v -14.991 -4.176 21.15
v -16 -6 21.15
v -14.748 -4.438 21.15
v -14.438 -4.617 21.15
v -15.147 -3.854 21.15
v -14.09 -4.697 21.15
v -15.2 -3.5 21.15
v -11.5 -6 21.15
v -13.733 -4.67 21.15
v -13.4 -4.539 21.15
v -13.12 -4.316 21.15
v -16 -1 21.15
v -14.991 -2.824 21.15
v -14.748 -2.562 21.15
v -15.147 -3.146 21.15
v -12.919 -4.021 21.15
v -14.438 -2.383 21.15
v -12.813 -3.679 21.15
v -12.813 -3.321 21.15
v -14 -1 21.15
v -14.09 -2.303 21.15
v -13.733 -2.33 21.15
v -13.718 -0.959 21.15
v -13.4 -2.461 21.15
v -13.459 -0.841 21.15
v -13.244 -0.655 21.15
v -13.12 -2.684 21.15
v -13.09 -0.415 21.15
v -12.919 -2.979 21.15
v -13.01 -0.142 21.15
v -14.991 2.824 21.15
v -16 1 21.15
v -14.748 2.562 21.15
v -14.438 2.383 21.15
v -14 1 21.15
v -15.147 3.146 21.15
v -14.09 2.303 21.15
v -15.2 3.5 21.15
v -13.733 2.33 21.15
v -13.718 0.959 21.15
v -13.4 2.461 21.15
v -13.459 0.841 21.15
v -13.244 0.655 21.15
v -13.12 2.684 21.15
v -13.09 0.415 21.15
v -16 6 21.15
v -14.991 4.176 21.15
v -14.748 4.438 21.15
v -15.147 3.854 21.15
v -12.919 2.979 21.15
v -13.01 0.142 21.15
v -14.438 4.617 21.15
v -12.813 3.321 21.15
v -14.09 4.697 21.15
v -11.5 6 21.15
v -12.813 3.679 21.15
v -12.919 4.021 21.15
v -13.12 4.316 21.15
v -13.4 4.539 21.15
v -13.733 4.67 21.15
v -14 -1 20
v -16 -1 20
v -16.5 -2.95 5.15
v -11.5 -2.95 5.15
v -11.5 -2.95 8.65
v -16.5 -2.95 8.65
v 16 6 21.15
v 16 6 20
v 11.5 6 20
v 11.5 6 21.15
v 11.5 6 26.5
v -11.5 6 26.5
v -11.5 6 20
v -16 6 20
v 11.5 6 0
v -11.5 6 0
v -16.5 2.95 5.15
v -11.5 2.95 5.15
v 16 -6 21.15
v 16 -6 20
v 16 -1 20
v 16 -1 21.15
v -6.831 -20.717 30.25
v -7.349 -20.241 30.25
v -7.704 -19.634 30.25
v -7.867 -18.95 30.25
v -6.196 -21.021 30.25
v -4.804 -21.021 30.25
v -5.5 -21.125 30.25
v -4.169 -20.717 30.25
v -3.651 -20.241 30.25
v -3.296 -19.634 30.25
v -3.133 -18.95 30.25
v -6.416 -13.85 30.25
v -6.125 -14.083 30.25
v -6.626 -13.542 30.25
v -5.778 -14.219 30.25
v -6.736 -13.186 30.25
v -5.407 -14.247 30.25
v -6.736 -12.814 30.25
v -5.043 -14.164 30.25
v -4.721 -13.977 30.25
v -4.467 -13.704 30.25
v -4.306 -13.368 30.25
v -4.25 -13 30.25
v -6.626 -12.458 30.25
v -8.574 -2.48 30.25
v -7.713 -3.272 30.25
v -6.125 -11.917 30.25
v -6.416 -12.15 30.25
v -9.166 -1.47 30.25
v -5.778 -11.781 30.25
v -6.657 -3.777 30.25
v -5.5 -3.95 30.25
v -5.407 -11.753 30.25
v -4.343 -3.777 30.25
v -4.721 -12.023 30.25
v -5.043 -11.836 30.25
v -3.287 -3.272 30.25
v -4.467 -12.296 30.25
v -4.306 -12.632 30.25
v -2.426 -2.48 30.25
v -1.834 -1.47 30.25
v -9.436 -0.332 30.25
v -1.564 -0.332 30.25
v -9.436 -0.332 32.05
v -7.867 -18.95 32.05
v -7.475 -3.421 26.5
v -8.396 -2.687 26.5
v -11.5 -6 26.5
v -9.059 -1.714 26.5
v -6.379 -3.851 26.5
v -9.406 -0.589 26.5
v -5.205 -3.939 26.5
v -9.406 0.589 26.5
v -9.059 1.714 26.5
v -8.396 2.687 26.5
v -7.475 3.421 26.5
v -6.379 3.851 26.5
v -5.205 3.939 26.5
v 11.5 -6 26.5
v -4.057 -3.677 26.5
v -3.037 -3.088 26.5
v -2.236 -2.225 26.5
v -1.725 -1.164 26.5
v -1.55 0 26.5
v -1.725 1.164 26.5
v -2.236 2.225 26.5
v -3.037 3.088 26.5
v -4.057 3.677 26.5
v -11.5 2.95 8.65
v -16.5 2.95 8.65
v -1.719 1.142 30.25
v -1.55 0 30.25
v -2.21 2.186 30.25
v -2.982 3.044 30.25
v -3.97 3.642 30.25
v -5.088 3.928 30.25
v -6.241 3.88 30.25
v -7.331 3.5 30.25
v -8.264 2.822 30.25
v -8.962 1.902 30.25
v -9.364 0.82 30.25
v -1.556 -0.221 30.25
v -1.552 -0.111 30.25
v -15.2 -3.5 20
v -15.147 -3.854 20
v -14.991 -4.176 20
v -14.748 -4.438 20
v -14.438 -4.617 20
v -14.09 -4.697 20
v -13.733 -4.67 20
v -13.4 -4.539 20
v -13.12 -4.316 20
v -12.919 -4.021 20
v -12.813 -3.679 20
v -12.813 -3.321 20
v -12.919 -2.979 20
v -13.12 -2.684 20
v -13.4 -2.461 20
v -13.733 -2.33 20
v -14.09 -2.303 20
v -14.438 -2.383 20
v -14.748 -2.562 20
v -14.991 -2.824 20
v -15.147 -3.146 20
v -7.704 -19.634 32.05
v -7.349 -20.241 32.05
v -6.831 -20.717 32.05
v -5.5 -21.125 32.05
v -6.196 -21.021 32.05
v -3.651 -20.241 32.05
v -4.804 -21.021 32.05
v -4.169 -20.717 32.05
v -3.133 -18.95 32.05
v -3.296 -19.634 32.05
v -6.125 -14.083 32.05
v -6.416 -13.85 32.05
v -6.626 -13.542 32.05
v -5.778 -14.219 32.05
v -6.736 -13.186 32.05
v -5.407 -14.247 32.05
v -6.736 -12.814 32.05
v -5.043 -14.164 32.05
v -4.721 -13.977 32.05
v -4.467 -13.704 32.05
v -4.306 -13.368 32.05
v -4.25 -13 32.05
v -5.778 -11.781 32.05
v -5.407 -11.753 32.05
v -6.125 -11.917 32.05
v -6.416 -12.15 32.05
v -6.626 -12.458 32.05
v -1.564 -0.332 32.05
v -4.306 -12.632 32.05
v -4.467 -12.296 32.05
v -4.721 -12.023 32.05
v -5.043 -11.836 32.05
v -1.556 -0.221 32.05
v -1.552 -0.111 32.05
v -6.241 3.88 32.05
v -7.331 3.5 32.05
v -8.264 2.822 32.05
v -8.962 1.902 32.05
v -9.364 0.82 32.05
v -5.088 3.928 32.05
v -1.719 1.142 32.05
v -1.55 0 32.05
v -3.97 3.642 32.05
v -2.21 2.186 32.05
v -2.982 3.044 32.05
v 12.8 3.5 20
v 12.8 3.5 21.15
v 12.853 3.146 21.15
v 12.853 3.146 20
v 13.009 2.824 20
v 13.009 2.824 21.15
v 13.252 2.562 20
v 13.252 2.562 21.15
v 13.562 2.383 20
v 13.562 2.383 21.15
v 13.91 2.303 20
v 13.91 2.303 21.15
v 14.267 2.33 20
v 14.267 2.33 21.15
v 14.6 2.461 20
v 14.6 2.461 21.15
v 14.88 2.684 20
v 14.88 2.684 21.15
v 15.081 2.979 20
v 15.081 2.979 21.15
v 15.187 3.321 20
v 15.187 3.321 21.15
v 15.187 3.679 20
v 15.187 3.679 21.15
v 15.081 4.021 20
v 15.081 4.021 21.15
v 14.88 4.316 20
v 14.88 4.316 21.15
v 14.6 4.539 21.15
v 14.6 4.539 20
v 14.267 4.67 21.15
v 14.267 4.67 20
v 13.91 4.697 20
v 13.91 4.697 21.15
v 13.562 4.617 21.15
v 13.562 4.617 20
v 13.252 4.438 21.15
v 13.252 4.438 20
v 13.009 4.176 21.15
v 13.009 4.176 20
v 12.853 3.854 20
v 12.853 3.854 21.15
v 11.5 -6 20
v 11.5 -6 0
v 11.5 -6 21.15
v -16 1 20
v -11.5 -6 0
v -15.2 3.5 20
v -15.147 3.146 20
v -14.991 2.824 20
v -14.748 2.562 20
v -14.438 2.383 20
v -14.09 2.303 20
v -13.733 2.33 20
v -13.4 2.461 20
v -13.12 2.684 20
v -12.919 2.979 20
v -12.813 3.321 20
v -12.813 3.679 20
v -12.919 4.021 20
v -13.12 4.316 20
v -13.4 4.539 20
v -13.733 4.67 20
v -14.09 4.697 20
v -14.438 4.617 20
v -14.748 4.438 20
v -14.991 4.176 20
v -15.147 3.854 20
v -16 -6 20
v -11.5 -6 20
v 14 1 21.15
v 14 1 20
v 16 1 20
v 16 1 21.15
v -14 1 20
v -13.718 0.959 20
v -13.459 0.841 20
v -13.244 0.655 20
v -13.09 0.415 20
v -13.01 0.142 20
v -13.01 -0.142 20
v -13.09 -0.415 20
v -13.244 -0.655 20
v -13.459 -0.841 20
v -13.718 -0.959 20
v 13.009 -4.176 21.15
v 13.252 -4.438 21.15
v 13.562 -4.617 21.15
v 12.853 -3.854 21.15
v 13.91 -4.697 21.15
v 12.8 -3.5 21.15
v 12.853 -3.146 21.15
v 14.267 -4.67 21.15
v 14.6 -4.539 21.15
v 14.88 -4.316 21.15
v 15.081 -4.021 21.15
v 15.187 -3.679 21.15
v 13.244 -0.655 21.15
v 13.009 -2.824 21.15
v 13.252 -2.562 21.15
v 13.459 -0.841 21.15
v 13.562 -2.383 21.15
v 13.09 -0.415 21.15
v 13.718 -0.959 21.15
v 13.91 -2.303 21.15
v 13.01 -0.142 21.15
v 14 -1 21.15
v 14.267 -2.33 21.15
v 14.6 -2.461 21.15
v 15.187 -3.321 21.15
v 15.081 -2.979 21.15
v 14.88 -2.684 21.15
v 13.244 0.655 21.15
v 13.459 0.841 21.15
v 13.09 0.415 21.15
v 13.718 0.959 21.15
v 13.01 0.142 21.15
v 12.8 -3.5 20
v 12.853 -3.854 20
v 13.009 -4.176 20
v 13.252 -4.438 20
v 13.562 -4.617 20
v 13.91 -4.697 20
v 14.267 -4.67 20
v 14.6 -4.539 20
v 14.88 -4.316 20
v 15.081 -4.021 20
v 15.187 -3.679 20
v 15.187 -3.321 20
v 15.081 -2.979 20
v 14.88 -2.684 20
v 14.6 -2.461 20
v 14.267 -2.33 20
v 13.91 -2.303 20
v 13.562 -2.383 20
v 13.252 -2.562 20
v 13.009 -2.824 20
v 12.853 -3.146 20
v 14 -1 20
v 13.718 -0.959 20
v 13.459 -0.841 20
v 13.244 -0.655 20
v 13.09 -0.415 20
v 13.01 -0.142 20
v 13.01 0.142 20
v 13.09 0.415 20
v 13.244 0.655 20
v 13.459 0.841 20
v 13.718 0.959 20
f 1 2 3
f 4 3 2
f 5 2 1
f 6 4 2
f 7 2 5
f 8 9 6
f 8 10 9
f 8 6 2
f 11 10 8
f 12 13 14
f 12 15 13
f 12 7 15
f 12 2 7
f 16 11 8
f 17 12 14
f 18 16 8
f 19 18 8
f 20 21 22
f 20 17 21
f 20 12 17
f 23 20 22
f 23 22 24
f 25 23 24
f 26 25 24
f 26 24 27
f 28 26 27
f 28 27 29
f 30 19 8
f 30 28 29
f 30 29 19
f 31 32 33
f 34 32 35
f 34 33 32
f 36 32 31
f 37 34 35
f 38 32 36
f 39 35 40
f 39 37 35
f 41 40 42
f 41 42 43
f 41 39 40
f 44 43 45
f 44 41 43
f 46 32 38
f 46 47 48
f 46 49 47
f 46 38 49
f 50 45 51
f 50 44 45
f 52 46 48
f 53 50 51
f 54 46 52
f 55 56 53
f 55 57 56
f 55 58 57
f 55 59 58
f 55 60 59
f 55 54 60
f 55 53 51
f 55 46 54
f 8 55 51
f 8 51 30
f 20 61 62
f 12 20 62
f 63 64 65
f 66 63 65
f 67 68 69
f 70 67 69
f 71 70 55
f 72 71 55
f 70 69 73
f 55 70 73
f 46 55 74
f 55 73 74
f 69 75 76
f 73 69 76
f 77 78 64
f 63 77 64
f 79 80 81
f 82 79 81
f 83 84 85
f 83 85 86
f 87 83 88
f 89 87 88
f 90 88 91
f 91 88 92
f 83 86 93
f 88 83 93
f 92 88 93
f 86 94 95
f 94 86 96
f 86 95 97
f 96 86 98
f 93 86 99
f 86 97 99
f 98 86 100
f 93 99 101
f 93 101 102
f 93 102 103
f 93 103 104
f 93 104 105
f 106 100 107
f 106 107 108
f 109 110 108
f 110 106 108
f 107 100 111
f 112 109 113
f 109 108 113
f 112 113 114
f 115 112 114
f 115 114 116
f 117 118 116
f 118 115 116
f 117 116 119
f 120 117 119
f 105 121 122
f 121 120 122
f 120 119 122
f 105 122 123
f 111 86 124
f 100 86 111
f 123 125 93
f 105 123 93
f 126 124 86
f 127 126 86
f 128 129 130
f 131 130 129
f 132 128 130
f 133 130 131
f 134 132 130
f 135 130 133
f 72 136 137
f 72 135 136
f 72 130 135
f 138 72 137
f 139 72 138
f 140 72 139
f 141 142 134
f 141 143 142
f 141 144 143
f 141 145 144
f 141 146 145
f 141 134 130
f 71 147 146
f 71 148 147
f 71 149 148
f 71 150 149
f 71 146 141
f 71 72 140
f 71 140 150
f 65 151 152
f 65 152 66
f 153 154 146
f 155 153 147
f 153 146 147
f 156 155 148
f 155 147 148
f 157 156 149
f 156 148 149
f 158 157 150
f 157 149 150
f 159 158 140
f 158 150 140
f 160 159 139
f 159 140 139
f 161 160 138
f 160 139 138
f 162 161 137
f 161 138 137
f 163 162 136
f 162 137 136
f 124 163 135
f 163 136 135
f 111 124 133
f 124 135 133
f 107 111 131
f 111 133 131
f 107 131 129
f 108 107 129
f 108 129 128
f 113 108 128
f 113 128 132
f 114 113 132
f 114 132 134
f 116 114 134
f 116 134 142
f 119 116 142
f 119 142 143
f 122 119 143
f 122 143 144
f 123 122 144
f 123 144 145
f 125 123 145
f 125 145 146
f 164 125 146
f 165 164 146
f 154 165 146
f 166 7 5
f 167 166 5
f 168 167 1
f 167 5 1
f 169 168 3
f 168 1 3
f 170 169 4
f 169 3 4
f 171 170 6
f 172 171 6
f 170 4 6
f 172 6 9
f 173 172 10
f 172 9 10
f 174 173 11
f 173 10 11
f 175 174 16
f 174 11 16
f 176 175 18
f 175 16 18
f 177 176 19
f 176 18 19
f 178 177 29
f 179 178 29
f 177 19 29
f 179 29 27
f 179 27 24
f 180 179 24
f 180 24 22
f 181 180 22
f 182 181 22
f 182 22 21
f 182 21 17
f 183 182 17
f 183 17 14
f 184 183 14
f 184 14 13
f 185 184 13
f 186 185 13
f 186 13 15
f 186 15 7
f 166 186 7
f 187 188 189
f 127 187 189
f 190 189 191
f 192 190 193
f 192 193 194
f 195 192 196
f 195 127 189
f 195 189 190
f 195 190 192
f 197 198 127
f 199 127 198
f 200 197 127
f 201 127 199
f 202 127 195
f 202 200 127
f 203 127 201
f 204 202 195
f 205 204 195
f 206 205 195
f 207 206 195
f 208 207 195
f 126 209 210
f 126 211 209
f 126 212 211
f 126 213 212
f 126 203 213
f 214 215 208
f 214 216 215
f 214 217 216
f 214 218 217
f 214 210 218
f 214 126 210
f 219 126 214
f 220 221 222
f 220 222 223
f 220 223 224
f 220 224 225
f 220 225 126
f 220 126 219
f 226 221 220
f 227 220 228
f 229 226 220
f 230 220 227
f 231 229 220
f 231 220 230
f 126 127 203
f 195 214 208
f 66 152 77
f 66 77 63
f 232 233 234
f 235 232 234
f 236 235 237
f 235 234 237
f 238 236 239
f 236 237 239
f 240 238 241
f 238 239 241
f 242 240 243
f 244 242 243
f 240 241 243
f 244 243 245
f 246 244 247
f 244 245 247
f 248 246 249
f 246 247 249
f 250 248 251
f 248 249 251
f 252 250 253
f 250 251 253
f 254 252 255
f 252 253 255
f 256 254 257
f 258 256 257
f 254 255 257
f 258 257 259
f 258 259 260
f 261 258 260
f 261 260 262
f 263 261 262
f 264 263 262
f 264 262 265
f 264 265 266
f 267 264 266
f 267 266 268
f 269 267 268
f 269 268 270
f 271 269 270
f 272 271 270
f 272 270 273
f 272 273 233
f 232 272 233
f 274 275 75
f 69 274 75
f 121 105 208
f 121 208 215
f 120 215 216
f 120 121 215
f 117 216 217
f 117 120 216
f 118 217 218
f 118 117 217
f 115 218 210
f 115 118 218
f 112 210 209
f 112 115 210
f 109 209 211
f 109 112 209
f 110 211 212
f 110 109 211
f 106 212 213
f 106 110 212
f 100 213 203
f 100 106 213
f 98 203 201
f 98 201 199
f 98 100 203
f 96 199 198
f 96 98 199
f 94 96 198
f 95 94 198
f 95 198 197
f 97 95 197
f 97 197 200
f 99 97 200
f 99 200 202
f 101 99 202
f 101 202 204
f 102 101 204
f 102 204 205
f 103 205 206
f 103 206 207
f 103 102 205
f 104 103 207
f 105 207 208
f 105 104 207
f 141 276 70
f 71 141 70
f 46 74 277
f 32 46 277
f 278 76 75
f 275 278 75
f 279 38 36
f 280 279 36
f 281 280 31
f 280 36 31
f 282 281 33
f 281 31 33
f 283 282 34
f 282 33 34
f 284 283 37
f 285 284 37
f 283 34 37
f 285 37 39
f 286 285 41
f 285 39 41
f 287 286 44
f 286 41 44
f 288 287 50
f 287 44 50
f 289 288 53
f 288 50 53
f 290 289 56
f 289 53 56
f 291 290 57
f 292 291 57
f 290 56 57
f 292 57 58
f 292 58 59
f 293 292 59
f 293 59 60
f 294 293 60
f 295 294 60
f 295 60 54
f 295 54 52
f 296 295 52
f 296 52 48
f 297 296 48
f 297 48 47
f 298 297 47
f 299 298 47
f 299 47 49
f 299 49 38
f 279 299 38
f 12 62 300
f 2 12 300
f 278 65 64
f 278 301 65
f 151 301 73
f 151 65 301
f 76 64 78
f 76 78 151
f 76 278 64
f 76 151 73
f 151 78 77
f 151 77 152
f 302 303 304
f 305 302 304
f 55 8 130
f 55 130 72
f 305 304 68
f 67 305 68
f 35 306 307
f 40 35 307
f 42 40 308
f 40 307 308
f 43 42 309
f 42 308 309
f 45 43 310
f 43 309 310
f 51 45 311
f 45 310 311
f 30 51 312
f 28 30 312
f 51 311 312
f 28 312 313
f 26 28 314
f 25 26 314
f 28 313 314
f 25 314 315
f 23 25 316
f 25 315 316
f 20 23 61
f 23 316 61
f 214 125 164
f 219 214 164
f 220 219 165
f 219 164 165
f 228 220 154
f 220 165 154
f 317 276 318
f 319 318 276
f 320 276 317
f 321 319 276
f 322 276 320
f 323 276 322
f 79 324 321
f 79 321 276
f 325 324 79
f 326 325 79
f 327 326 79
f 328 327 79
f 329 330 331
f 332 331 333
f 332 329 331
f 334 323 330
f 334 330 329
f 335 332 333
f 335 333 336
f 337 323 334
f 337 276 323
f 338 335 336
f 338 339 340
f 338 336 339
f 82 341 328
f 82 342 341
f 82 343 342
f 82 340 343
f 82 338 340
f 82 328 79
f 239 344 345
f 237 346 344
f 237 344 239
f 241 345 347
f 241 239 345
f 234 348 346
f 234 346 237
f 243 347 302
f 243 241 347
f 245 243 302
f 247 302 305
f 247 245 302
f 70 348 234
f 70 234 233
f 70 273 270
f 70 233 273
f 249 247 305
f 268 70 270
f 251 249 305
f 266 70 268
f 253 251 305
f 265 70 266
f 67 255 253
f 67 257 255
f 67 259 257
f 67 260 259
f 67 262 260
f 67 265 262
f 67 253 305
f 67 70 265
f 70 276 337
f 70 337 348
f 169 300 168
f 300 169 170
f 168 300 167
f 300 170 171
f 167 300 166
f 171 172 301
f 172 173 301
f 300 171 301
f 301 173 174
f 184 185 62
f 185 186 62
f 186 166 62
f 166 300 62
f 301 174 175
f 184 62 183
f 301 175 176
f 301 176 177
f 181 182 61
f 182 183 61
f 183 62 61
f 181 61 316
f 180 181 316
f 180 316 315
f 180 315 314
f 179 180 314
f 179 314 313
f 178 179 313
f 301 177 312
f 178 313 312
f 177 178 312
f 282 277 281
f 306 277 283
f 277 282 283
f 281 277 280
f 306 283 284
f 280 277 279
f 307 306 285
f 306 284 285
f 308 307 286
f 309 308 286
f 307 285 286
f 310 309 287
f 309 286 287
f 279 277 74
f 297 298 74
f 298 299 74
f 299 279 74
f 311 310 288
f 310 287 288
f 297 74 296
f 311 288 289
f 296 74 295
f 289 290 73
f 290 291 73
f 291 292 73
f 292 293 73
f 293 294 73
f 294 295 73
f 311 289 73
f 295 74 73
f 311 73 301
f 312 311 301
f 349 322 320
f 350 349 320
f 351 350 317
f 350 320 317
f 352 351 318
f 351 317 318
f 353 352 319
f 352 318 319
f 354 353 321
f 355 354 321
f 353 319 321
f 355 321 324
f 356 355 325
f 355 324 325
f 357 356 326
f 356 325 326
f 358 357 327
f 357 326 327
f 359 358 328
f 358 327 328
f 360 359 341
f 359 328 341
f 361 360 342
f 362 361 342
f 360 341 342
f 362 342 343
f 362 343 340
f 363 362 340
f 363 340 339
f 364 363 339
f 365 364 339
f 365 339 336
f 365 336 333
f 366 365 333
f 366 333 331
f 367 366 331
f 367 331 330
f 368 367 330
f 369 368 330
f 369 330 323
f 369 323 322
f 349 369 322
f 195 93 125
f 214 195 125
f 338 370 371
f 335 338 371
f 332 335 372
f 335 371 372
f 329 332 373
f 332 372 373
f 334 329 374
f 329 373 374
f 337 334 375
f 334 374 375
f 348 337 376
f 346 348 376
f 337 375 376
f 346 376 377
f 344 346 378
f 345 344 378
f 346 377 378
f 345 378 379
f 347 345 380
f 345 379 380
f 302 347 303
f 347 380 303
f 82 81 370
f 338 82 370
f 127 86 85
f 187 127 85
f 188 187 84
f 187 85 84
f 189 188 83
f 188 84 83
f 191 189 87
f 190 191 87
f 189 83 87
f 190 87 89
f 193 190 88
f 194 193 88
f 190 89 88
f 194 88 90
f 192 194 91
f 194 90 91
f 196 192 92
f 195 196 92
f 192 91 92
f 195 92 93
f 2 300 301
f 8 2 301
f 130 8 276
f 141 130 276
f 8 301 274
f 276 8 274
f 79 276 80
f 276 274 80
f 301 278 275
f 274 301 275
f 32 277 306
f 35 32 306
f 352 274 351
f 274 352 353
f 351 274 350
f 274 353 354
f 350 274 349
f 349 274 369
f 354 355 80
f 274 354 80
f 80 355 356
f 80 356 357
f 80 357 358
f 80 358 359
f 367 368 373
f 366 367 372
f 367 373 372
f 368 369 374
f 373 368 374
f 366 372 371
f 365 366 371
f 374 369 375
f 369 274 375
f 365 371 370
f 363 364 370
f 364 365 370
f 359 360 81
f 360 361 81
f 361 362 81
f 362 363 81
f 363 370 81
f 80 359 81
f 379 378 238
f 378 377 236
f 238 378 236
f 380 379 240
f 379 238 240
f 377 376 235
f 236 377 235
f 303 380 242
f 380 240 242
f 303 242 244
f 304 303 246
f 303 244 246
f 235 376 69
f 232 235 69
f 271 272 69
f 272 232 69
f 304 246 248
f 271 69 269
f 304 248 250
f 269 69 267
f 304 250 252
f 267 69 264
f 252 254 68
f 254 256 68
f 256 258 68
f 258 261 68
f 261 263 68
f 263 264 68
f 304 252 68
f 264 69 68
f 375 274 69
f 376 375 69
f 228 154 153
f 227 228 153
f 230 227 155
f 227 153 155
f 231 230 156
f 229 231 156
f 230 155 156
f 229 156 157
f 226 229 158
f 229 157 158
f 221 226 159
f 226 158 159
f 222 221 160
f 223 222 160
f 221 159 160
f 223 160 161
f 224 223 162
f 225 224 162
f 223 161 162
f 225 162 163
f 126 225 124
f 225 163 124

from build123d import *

# Parameters (mm, degrees)
F0_W      = 23
F0_H      = 12
F1_DEPTH  = 26.5
F4_DEPTH  = 1.15
F5_D      = 2.4
F6_R      = 3.95
F7_DEPTH  = 3.75
F8_R      = 1.25
F9_DEPTH  = 1.8
F10_W     = 5.9
F10_H     = 3.5
F11_DEPTH = 5


with BuildPart() as f1:
    # F0 (on Top) → F1 (new body)
    with BuildSketch(Plane.XY):
        Rectangle(F0_W, F0_H)
    extrude(amount=F1_DEPTH)

    # F3 (on offset) → F4 (join)
    with BuildSketch(Plane.XY.offset(20)):
        with BuildLine():
            Line((16, 1), (16, 6))
            Line((16, 6), (-16, 6))
            Line((-16, 6), (-16, 1))
            Line((-16, 1), (-14, 1))
            ThreePointArc((-14, 1), (-13, 0), (-14, -1))
            Line((-14, -1), (-16, -1))
            Line((-16, -1), (-16, -6))
            Line((-16, -6), (16, -6))
            Line((16, -6), (16, -1))
            Line((16, -1), (14, -1))
            ThreePointArc((14, -1), (13, 0), (14, 1))
            Line((14, 1), (16, 1))
        make_face()
    extrude(amount=F4_DEPTH)

    # F5 (through all)
    with Locations(Plane(origin=(0, 0, 20), x_dir=(1, 0, 0), z_dir=(0, 0, -1))):
        with Locations((-14, 3.5), (-14, -3.5), (14, 3.5), (14, -3.5)):
            Hole(F5_D / 2)

    # F6 (on face) → F7 (join)
    with BuildSketch(Plane.XY.offset(26.5)):
        with Locations((-5.5, 0)):
            Circle(F6_R)
    extrude(amount=F7_DEPTH)

    # F8 (on face) → F9 (join)
    with BuildSketch(Plane.XY.offset(30.25)):
        with BuildLine():
            ThreePointArc((-1.56396, -0.3318), (-1.553492, -0.166047), (-1.55, 0))
            ThreePointArc((-1.55, 0), (-5.666047, 3.946508), (-9.43604, -0.3318))
            ThreePointArc((-9.43604, -0.3318), (-5.5, -3.95), (-1.56396, -0.3318))
        make_face()
        with BuildLine():
            ThreePointArc((-1.56396, -0.3318), (-5.5, -3.95), (-9.43604, -0.3318))
            Line((-9.43604, -0.3318), (-7.866606, -18.9495))
            ThreePointArc((-7.866606, -18.9495), (-5.599838, -16.377099), (-3.125, -18.75))
            ThreePointArc((-3.125, -18.75), (-3.127099, -18.849838), (-3.133394, -18.9495))
            Line((-3.133394, -18.9495), (-1.56396, -0.3318))
        make_face()
        with Locations((-5.5, -13)):
            Circle(F8_R, mode=Mode.SUBTRACT)
        with BuildLine():
            ThreePointArc((-3.125, -18.75), (-5.599838, -16.377099), (-7.866606, -18.9495))
            ThreePointArc((-7.866606, -18.9495), (-5.5, -21.125), (-3.133394, -18.9495))
            ThreePointArc((-3.133394, -18.9495), (-3.127099, -18.849838), (-3.125, -18.75))
        make_face()
    extrude(amount=F9_DEPTH)

    # F10 (on face) → F11 (join)
    with BuildSketch(Plane(origin=(-11.5, 0, 0), x_dir=(0, -1, 0), z_dir=(-1, 0, 0))):
        with Locations((0, 6.9)):
            Rectangle(F10_W, F10_H)
    extrude(amount=F11_DEPTH)


solid = f1.part
